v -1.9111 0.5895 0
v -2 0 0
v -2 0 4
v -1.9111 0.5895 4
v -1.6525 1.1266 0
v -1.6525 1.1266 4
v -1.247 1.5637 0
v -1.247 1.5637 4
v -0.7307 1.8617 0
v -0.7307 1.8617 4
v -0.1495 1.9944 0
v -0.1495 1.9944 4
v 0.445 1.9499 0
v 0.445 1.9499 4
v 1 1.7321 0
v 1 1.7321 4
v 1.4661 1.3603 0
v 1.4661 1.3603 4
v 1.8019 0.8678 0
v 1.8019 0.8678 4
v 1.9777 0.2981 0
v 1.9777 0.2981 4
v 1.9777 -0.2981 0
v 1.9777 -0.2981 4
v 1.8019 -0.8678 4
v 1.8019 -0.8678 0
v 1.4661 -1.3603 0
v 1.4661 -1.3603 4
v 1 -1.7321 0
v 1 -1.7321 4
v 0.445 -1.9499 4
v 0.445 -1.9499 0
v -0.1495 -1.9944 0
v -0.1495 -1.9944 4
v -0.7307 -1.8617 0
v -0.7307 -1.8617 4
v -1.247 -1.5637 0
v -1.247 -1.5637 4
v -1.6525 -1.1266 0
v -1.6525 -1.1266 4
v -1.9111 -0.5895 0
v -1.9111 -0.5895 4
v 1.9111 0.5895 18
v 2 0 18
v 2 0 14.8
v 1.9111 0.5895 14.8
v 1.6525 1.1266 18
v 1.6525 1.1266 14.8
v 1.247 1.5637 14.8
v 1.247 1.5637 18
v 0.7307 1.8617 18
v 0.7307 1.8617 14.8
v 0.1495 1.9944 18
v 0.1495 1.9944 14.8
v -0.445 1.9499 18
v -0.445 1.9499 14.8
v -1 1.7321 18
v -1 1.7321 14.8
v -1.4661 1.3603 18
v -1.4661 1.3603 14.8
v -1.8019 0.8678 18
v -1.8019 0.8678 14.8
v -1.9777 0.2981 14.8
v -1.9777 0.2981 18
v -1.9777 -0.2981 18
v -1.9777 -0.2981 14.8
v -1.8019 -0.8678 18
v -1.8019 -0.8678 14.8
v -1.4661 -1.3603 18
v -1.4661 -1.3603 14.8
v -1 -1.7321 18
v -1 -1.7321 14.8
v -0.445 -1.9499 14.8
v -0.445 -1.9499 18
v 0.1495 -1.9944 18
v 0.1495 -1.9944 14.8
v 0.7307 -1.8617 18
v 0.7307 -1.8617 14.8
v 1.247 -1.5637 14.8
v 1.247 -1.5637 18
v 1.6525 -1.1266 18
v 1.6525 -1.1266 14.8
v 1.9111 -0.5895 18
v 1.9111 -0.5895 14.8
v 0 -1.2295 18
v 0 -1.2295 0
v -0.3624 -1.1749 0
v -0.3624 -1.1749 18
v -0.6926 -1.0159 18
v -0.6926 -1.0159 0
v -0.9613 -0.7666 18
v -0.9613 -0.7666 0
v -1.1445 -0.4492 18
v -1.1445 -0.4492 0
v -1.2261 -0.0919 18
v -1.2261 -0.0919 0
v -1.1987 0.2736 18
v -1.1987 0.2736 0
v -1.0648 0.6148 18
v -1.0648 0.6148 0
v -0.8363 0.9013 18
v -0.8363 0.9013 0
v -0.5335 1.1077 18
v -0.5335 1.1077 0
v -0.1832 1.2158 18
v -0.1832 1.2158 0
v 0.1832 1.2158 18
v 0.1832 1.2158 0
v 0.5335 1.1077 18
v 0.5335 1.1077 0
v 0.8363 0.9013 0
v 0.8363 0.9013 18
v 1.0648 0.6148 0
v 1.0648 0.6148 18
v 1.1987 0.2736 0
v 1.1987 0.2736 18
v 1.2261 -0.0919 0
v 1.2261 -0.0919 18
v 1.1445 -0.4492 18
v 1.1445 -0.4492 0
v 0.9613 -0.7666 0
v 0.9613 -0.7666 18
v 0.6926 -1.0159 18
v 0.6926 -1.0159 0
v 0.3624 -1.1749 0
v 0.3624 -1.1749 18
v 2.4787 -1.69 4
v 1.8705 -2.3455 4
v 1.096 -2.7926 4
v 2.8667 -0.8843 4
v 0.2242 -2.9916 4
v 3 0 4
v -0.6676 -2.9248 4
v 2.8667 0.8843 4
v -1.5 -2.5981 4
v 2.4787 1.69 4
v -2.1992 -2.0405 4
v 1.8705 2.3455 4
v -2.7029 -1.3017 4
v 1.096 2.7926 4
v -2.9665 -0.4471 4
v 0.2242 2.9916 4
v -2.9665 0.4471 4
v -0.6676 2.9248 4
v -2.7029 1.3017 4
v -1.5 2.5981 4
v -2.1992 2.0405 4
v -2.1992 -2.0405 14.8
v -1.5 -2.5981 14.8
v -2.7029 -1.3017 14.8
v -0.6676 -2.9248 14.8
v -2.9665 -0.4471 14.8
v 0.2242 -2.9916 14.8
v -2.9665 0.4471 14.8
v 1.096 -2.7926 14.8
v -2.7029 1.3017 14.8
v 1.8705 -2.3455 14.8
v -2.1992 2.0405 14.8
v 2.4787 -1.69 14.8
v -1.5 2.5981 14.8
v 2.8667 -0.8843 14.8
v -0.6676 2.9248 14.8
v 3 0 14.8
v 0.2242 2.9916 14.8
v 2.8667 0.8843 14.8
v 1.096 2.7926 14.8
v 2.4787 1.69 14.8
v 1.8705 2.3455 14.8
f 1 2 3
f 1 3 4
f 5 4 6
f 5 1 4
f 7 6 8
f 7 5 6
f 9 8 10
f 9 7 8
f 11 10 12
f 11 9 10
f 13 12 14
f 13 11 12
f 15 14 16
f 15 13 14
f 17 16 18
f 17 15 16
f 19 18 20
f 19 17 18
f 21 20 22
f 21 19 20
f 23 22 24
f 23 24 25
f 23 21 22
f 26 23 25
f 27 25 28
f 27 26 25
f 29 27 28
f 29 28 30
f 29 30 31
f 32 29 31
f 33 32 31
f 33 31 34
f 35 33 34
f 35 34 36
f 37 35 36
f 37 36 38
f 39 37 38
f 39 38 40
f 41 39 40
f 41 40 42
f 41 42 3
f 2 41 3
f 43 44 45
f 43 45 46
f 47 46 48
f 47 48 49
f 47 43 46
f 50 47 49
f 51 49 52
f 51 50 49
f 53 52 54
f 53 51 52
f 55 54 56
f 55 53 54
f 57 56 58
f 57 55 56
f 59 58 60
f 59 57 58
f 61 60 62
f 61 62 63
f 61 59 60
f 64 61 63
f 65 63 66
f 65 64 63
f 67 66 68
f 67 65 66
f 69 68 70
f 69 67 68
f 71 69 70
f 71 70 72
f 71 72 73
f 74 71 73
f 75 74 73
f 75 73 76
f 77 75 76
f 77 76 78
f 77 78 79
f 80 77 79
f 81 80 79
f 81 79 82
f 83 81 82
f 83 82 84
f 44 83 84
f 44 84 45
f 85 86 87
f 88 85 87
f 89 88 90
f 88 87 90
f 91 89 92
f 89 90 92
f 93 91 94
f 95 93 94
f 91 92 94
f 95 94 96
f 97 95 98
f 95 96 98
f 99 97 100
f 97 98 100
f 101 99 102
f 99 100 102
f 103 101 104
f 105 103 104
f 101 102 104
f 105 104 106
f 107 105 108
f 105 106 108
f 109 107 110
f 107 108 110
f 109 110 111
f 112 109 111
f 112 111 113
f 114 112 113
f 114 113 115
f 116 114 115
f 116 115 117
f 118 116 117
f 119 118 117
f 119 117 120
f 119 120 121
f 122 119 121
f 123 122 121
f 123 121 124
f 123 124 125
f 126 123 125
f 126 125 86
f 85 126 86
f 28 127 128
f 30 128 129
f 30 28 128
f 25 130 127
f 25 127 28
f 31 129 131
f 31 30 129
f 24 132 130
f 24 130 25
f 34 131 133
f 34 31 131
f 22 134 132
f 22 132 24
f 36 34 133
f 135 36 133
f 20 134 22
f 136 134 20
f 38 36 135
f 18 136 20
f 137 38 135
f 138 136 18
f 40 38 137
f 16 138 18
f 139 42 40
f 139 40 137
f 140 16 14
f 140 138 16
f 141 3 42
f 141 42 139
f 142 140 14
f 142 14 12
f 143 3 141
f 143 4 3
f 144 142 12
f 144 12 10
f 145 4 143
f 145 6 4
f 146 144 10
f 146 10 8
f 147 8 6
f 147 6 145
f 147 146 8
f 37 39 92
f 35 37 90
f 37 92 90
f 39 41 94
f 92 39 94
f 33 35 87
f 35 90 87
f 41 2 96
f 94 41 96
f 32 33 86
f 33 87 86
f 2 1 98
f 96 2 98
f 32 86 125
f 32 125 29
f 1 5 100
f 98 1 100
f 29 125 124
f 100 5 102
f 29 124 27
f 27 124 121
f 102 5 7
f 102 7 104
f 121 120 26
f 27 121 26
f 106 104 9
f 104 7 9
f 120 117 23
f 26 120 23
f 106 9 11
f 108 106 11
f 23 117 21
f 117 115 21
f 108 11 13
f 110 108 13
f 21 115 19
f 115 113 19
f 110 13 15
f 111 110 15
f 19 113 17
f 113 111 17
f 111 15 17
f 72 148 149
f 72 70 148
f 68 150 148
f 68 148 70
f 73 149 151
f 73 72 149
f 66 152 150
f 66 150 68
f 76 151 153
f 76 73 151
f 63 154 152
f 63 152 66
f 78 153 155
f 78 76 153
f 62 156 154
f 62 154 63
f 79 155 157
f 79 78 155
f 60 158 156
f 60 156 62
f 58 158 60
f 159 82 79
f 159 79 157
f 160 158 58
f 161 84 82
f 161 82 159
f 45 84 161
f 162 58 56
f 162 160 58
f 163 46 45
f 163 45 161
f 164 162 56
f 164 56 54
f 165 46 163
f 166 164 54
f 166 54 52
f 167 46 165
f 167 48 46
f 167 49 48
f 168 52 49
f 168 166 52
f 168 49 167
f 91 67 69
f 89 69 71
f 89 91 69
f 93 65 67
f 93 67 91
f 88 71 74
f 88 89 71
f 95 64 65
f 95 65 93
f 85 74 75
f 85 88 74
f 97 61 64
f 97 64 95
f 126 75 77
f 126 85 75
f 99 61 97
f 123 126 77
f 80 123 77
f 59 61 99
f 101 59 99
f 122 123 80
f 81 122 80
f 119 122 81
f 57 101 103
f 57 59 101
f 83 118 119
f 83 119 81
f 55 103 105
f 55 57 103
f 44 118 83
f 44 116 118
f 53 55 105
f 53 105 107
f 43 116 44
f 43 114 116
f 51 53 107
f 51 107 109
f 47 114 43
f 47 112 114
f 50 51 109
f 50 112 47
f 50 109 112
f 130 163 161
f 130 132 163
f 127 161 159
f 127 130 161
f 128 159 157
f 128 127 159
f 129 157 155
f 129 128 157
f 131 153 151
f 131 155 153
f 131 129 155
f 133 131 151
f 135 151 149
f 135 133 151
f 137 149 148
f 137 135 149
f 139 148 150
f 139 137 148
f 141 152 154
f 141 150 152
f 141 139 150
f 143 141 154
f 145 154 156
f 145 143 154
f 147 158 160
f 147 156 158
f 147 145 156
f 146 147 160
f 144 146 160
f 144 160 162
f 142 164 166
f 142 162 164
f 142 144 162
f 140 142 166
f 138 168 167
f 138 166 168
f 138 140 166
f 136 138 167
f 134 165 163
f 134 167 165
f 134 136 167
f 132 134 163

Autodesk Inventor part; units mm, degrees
ref_plane "YZ Plane" through (0, 0, 0) normal (1, 0, 0) x (0, 1, 0)
ref_plane "XZ Plane" through (0, 0, 0) normal (0, 1, 0) x (-1, 0, 0)
ref_plane "XY Plane" through (0, 0, 0) normal (0, 0, 1) x (1, 0, 0)
sketch "スケッチ1" plane through (0, 0, 0) normal (0, 0, 1) x (1, 0, 0)
  circle A0 centre (0, 0) radius 3
  dimension "d0" = 6
extrude "押し出し1" add sketch "スケッチ1" along normal blind 18
sketch "スケッチ3" plane through (0, 0, 18) normal (0, 0, 1) x (1, 0, 0)
  circle A0 centre (0, 0) radius 3 projected
hole "Hole2" at (0, 0, 18) direction (0, 0, -1) diameter 2.459 end through all thread size "M3x0.5" class "6H" standard "ISO Metric profile"
sketch "スケッチ4" plane through (0, 0, 18) normal (0, 0, 1) x (1, 0, 0)
  circle A0 centre (0, 0) radius 3 projected
  circle A1 centre (0, 0) radius 2
  dimension "d20" = 4
extrude "押し出し2" cut sketch "スケッチ4" against normal blind 3.2
sketch "スケッチ5" plane through (0, 0, 0) normal (0, 0, -1) x (-1, 0, 0)
  circle A0 centre (0, 0) radius 3 projected
  circle A1 centre (0, 0) radius 2
  dimension "d23" = 4
extrude "押し出し3" cut sketch "スケッチ5" against normal blind 4
properties part number "shaft6-19"
